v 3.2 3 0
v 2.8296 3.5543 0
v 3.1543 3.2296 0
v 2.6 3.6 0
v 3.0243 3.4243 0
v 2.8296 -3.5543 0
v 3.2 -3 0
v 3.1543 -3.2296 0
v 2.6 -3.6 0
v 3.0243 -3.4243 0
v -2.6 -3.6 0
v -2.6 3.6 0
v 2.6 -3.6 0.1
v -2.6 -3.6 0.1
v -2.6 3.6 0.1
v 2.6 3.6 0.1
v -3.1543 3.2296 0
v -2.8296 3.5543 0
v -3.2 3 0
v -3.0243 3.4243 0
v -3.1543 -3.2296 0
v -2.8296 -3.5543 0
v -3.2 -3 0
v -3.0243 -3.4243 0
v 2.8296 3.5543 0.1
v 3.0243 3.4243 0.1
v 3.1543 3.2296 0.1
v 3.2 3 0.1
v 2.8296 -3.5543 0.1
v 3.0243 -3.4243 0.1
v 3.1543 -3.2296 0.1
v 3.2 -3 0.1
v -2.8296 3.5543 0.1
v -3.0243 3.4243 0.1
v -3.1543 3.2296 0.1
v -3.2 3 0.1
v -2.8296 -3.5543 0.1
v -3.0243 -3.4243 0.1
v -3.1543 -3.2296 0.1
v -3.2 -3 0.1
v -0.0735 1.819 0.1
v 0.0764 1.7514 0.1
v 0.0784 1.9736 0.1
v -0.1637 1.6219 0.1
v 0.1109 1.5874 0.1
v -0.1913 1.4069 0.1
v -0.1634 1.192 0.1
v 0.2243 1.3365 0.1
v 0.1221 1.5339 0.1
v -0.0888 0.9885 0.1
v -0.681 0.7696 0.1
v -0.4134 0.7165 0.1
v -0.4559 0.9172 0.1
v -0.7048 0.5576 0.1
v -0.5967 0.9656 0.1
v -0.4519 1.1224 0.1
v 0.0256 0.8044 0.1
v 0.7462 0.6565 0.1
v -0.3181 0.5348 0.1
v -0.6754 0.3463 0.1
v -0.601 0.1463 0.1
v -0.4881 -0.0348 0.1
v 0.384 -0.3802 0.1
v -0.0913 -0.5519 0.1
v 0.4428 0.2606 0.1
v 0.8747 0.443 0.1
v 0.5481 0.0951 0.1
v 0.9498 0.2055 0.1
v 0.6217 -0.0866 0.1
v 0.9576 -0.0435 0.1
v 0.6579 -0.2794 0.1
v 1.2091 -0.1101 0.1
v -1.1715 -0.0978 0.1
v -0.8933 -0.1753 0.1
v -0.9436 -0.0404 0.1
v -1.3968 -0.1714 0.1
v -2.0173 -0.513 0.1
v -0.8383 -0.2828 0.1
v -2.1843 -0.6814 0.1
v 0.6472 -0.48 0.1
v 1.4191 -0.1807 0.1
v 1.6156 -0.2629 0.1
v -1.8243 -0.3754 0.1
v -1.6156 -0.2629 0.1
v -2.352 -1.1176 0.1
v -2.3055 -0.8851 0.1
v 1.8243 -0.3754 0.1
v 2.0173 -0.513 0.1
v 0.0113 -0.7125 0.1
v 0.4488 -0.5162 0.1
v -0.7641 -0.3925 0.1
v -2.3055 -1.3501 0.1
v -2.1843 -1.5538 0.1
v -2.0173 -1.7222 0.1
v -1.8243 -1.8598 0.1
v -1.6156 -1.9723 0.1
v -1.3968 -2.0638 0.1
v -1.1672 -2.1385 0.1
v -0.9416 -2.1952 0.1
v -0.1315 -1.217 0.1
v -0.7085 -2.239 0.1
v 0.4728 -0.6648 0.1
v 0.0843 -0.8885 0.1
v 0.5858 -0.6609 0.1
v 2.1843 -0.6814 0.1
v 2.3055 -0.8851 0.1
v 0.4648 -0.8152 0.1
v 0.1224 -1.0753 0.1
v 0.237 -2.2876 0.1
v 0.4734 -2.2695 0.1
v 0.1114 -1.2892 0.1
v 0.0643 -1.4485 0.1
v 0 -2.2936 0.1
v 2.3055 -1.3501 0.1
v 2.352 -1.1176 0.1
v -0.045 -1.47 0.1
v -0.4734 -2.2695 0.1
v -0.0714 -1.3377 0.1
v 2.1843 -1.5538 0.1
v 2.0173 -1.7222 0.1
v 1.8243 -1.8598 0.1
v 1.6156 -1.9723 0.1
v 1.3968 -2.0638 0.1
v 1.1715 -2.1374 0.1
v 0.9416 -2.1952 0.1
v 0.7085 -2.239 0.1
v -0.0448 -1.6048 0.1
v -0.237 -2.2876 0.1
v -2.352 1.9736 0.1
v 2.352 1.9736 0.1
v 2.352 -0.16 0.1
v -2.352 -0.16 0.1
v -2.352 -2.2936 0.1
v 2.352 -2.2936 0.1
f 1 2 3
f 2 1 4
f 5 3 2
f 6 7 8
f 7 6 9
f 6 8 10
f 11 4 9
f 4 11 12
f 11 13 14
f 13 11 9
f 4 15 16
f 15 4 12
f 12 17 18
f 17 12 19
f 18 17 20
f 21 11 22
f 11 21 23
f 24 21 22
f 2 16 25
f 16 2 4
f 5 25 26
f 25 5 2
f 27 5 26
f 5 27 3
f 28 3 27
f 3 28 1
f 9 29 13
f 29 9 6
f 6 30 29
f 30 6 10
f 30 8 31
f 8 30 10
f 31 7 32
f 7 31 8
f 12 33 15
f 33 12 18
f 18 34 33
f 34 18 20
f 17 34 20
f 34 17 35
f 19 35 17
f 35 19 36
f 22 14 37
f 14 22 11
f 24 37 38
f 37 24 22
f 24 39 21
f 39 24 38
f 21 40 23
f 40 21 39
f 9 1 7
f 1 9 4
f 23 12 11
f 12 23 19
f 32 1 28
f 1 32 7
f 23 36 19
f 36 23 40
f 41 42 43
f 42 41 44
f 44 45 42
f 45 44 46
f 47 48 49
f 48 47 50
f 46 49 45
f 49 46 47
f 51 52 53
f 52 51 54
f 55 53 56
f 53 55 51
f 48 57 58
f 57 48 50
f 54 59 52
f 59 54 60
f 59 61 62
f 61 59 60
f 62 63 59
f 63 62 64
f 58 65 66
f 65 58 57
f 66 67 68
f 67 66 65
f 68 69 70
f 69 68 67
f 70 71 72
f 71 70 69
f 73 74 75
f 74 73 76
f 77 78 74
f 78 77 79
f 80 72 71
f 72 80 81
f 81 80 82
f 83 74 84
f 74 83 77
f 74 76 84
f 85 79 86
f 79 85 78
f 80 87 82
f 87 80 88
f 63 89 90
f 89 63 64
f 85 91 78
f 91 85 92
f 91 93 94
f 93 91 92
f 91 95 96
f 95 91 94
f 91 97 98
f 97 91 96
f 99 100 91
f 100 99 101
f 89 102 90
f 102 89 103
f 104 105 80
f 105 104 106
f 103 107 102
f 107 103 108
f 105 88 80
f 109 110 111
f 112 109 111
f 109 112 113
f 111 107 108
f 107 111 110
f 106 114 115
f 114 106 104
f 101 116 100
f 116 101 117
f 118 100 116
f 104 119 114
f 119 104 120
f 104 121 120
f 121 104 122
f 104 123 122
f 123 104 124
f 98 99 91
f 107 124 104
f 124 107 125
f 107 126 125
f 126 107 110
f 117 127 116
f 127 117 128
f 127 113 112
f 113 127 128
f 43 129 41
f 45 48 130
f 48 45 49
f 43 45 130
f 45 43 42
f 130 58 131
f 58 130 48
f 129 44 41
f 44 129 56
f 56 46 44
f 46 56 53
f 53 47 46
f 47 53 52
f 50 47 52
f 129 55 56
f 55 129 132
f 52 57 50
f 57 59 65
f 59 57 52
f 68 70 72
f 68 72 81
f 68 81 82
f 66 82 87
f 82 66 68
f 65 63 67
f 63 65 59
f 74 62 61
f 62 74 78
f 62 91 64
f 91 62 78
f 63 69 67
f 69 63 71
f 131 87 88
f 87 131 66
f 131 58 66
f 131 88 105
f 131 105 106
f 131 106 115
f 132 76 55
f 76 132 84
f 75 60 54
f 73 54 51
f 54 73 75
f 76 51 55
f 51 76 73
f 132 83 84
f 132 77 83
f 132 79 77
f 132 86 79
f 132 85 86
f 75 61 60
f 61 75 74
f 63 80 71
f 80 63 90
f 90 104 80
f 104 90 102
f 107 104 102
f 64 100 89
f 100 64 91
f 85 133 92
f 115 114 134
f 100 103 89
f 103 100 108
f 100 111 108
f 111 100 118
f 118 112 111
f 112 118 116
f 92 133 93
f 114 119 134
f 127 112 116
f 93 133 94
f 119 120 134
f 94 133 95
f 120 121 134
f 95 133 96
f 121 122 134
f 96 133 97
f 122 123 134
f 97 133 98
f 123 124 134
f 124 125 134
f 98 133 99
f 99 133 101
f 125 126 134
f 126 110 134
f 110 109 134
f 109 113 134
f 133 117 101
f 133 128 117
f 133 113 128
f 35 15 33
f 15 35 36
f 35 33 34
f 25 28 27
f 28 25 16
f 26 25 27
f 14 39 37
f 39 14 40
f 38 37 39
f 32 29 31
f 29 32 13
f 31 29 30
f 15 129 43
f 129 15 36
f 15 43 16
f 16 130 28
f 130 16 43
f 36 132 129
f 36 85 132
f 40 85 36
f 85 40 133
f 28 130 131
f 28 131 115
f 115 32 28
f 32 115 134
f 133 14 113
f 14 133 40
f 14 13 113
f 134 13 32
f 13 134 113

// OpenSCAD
// file: ../p/box3u12.scad
use <../lib.scad>
function ldraw_lib__box3u12() = [
// 0 Box with 3 Parallel Faces without Any Edges
// 0 Name: box3u12.dat
// 0 Author: J.C. Tchang [tchang]
// 0 !LDRAW_ORG Primitive UPDATE 2014-02
// 0 !LICENSE Licensed under CC BY 4.0 : see CAreadme.txt
// 
// 0 BFC CERTIFY CCW
  [0,"BFC","CERTIFY"],
  [0,"BFC","CCW"],
// 
// 0 !HISTORY 2014-12-23 [PTadmin] Official Update 2014-02
// 
// 
// 4 16 -1 1 1 1 1 1 1 1 -1 -1 1 -1
  [4,16,-1,1,1,1,1,1,1,1,-1,-1,1,-1],
// 4 16 -1 1 1 -1 0 1 1 0 1 1 1 1
  [4,16,-1,1,1,-1,0,1,1,0,1,1,1,1],
// 4 16 1 1 -1 1 0 -1 -1 0 -1 -1 1 -1
  [4,16,1,1,-1,1,0,-1,-1,0,-1,-1,1,-1],
];
module ldraw_lib__box3u12(step=0, col=false, unit=2/5, alt=false, line=0.2, solid=!$preview)
    makepoly(ldraw_lib__box3u12(), step=step, col=col, unit=unit, alt=alt, line=line, solid=solid);
ldraw_lib__box3u12(line=0.2);
// file: ../p/1-4cyli.scad
use <../lib.scad>
function ldraw_lib__1_4cyli() = [
// 0 Cylinder 0.25
// 0 Name: 1-4cyli.dat
// 0 Author: James Jessiman
// 0 !LDRAW_ORG Primitive UPDATE 2012-01
// 0 !LICENSE Licensed under CC BY 4.0 : see CAreadme.txt
// 
// 0 BFC CERTIFY CCW
  [0,"BFC","CERTIFY"],
  [0,"BFC","CCW"],
// 
// 0 !HISTORY 2002-03-23 [sbliss] Added BFC statement.
// 0 !HISTORY 2002-04-25 [PTadmin] Official Update 2002-02
// 0 !HISTORY 2007-06-22 [PTadmin] Header formatted for Contributor Agreement
// 0 !HISTORY 2008-07-01 [PTadmin] Official Update 2008-01
// 0 !HISTORY 2012-02-16 [Philo] Changed to CCW
// 0 !HISTORY 2012-03-30 [PTadmin] Official Update 2012-01
// 
// 
// 4 16 1 1 0 0.9239 1 0.3827 0.9239 0 0.3827 1 0 0
  [4,16,1,1,0,0.9239,1,0.3827,0.9239,0,0.3827,1,0,0],
// 5 24 1 0 0 1 1 0 0.9239 0 0.3827 1 0 -1
  [5,24,1,0,0,1,1,0,0.9239,0,0.3827,1,0,-1],
// 4 16 0.9239 1 0.3827 0.7071 1 0.7071 0.7071 0 0.7071 0.9239 0 0.3827
  [4,16,0.9239,1,0.3827,0.7071,1,0.7071,0.7071,0,0.7071,0.9239,0,0.3827],
// 5 24 0.9239 0 0.3827 0.9239 1 0.3827 0.7071 0 0.7071 1 0 0
  [5,24,0.9239,0,0.3827,0.9239,1,0.3827,0.7071,0,0.7071,1,0,0],
// 4 16 0.7071 1 0.7071 0.3827 1 0.9239 0.3827 0 0.9239 0.7071 0 0.7071
  [4,16,0.7071,1,0.7071,0.3827,1,0.9239,0.3827,0,0.9239,0.7071,0,0.7071],
// 5 24 0.7071 0 0.7071 0.7071 1 0.7071 0.3827 0 0.9239 0.9239 0 0.3827
  [5,24,0.7071,0,0.7071,0.7071,1,0.7071,0.3827,0,0.9239,0.9239,0,0.3827],
// 4 16 0.3827 1 0.9239 0 1 1 0 0 1 0.3827 0 0.9239
  [4,16,0.3827,1,0.9239,0,1,1,0,0,1,0.3827,0,0.9239],
// 5 24 0.3827 0 0.9239 0.3827 1 0.9239 0 0 1 0.7071 0 0.7071
  [5,24,0.3827,0,0.9239,0.3827,1,0.9239,0,0,1,0.7071,0,0.7071],
// 5 24 0 0 1 0 1 1 0.3827 0 0.9239 -1 0 1
  [5,24,0,0,1,0,1,1,0.3827,0,0.9239,-1,0,1],
];
module ldraw_lib__1_4cyli(step=0, col=false, unit=2/5, alt=false, line=0.2, solid=!$preview)
    makepoly(ldraw_lib__1_4cyli(), step=step, col=col, unit=unit, alt=alt, line=line, solid=solid);
ldraw_lib__1_4cyli(line=0.2);
// file: s/stickerback008x009.scad
use <../../lib.scad>
use <../../p/1-4chrd.scad>
use <../../p/1-4cyli.scad>
use <../../p/box3u12.scad>
function ldraw_lib__s__stickerback008x009() = [
// 0 ~Sticker Back  0.8 x  0.9
// 0 Name: s\stickerback008x009.dat
// 0 Author: Massimo Maso [Sirio]
// 0 !LDRAW_ORG Subpart UPDATE 2026-05
// 0 !LICENSE Licensed under CC BY 4.0 : see CAreadme.txt
// 
// 0 BFC CERTIFY CCW
  [0,"BFC","CERTIFY"],
  [0,"BFC","CCW"],
// 
// 0 !HISTORY 2025-08-31 [OrionP] Official Update 2025-08
// 0 !HISTORY 2026-04-18 [MagFors] corrected length
// 0 !HISTORY 2026-05-31 [OrionP] Official Update 2026-05
// 
// 0 // Primitives
// 1 16 -7.5 0 6.5 -1.5 0 0 0 -1 0 0 0 1.5 1-4chrd.dat
  [1,16,-7.5,0,6.5,-1.5,0,0,0,-1,0,0,0,1.5, ldraw_lib__1_4chrd()],
// 1 16 7.5 0 6.5 1.5 0 0 0 -1 0 0 0 1.5 1-4chrd.dat
  [1,16,7.5,0,6.5,1.5,0,0,0,-1,0,0,0,1.5, ldraw_lib__1_4chrd()],
// 1 16 0 -.25 0 0 0 9 0 .25 0 6.5 0 0 box3u12.dat
  [1,16,0,-.25,0,0,0,9,0,.25,0,6.5,0,0, ldraw_lib__box3u12()],
// 1 16 -7.5 0 -6.5 -1.5 0 0 0 -1 0 0 0 -1.5 1-4chrd.dat
  [1,16,-7.5,0,-6.5,-1.5,0,0,0,-1,0,0,0,-1.5, ldraw_lib__1_4chrd()],
// 1 16 7.5 0 -6.5 1.5 0 0 0 -1 0 0 0 -1.5 1-4chrd.dat
  [1,16,7.5,0,-6.5,1.5,0,0,0,-1,0,0,0,-1.5, ldraw_lib__1_4chrd()],
// 1 16 -7.5 0 6.5 -1.5 0 0 0 -.25 0 0 0 1.5 1-4cyli.dat
  [1,16,-7.5,0,6.5,-1.5,0,0,0,-.25,0,0,0,1.5, ldraw_lib__1_4cyli()],
// 1 16 7.5 0 6.5 1.5 0 0 0 -.25 0 0 0 1.5 1-4cyli.dat
  [1,16,7.5,0,6.5,1.5,0,0,0,-.25,0,0,0,1.5, ldraw_lib__1_4cyli()],
// 1 16 -7.5 0 -6.5 -1.5 0 0 0 -.25 0 0 0 -1.5 1-4cyli.dat
  [1,16,-7.5,0,-6.5,-1.5,0,0,0,-.25,0,0,0,-1.5, ldraw_lib__1_4cyli()],
// 1 16 7.5 0 -6.5 1.5 0 0 0 -.25 0 0 0 -1.5 1-4cyli.dat
  [1,16,7.5,0,-6.5,1.5,0,0,0,-.25,0,0,0,-1.5, ldraw_lib__1_4cyli()],
// 0 // Bottom face
// 4 16 -7.5 0 8 7.5 0 8 9 0 6.5 -9 0 6.5
  [4,16,-7.5,0,8,7.5,0,8,9,0,6.5,-9,0,6.5],
// 4 16 -7.5 0 -8 -9 0 -6.5 9 0 -6.5 7.5 0 -8
  [4,16,-7.5,0,-8,-9,0,-6.5,9,0,-6.5,7.5,0,-8],
// 0 // Lateral face
// 4 16 -7.5 0 8 -7.5 -.25 8 7.5 -.25 8 7.5 0 8
  [4,16,-7.5,0,8,-7.5,-.25,8,7.5,-.25,8,7.5,0,8],
// 4 16 -7.5 0 -8 7.5 0 -8 7.5 -.25 -8 -7.5 -.25 -8
  [4,16,-7.5,0,-8,7.5,0,-8,7.5,-.25,-8,-7.5,-.25,-8],
];
module ldraw_lib__s__stickerback008x009(step=0, col=false, unit=2/5, alt=false, line=0.2, solid=!$preview)
    makepoly(ldraw_lib__s__stickerback008x009(), step=step, col=col, unit=unit, alt=alt, line=line, solid=solid);
ldraw_lib__s__stickerback008x009(line=0.2);
// file: ../p/logo-santander-icon.scad
use <../lib.scad>
function ldraw_lib__logo_santander_icon() = [
// 0 Logo Santander Icon
// 0 Name: logo-santander-icon.dat
// 0 Author: Massimo Maso [Sirio]
// 0 !LDRAW_ORG Primitive UPDATE 2026-05
// 0 !LICENSE Licensed under CC BY 4.0 : see CAreadme.txt
// 
// 0 !HELP Exact dimensions X = 5.6; Z = 5.08
// 
// 0 BFC CERTIFY CCW
  [0,"BFC","CERTIFY"],
  [0,"BFC","CCW"],
// 
// 0 !HISTORY 2025-06-16 [Sirio] Made primitive from subpart s\logosantanders02a
// 0 !HISTORY 2026-04-18 [MagFors] removed some vertices
// 0 !HISTORY 2026-05-31 [OrionP] Official Update 2026-05
// 
// 0 // Icon
// 4 16 .0933 0 2.54 -.0875 0 2.356 -.1949 0 2.1213 .091 0 2.2755
  [4,16,.0933,0,2.54,-.0875,0,2.356,-.1949,0,2.1213,.091,0,2.2755],
// 4 16 .091 0 2.2755 -.1949 0 2.1213 -.2277 0 1.8654 .132 0 2.0802
  [4,16,.091,0,2.2755,-.1949,0,2.1213,-.2277,0,1.8654,.132,0,2.0802],
// 4 16 -.1057 0 1.3673 .267 0 1.7815 .1454 0 2.0165 -.1945 0 1.6095
  [4,16,-.1057,0,1.3673,.267,0,1.7815,.1454,0,2.0165,-.1945,0,1.6095],
// 4 16 .132 0 2.0802 -.2277 0 1.8654 -.1945 0 1.6095 .1454 0 2.0165
  [4,16,.132,0,2.0802,-.2277,0,1.8654,-.1945,0,1.6095,.1454,0,2.0165],
// 4 16 -.5427 0 1.2824 -.8107 0 1.1067 -.8391 0 .8543 -.4921 0 1.0434
  [4,16,-.5427,0,1.2824,-.8107,0,1.1067,-.8391,0,.8543,-.4921,0,1.0434],
// 4 16 -.8107 0 1.1067 -.5427 0 1.2824 -.538 0 1.5267 -.7103 0 1.34
  [4,16,-.8107,0,1.1067,-.5427,0,1.2824,-.538,0,1.5267,-.7103,0,1.34],
// 4 16 -.1057 0 1.3673 .0305 0 1.1481 .8883 0 .972 .267 0 1.7815
  [4,16,-.1057,0,1.3673,.0305,0,1.1481,.8883,0,.972,.267,0,1.7815],
// 4 16 -.3787 0 .8271 -.4921 0 1.0434 -.8391 0 .8543 -.8041 0 .6027
  [4,16,-.3787,0,.8271,-.4921,0,1.0434,-.8391,0,.8543,-.8041,0,.6027],
// 4 16 -.3787 0 .8271 -.8041 0 .6027 -.7155 0 .3647 -.5811 0 .1491
  [4,16,-.3787,0,.8271,-.8041,0,.6027,-.7155,0,.3647,-.5811,0,.1491],
// 4 16 -.3787 0 .8271 -.5811 0 .1491 -.1087 0 -.4666 .4571 0 -.2622
  [4,16,-.3787,0,.8271,-.5811,0,.1491,-.1087,0,-.4666,.4571,0,-.2622],
// 4 16 .0305 0 1.1481 .5272 0 .5007 1.0413 0 .7179 .8883 0 .972
  [4,16,.0305,0,1.1481,.5272,0,.5007,1.0413,0,.7179,.8883,0,.972],
// 4 16 1.1307 0 .4351 1.0413 0 .7179 .5272 0 .5007 .6525 0 .3037
  [4,16,1.1307,0,.4351,1.0413,0,.7179,.5272,0,.5007,.6525,0,.3037],
// 4 16 1.14 0 .1387 1.1307 0 .4351 .6525 0 .3037 .7401 0 .0874
  [4,16,1.14,0,.1387,1.1307,0,.4351,.6525,0,.3037,.7401,0,.0874],
// 4 16 .7401 0 .0874 .7832 0 -.1421 1.4394 0 .0594 1.14 0 .1387
  [4,16,.7401,0,.0874,.7832,0,-.1421,1.4394,0,.0594,1.14,0,.1387],
// 4 16 -1.3946 0 .074 -1.6629 0 -.0136 -1.0635 0 -.0182 -1.1233 0 .1424
  [4,16,-1.3946,0,.074,-1.6629,0,-.0136,-1.0635,0,-.0182,-1.1233,0,.1424],
// 4 16 -.998 0 -.1462 -1.0635 0 -.0182 -2.4016 0 -.4202 -2.6003 0 -.6207
  [4,16,-.998,0,-.1462,-1.0635,0,-.0182,-2.4016,0,-.4202,-2.6003,0,-.6207],
// 4 16 .7832 0 -.1421 .7705 0 -.3809 1.6894 0 -.0247 1.4394 0 .0594
  [4,16,.7832,0,-.1421,.7705,0,-.3809,1.6894,0,-.0247,1.4394,0,.0594],
// 3 16 1.6894 0 -.0247 .7705 0 -.3809 1.9233 0 -.1225
  [3,16,1.6894,0,-.0247,.7705,0,-.3809,1.9233,0,-.1225],
// 4 16 -2.4016 0 -.4202 -1.0635 0 -.0182 -1.9233 0 -.1225 -2.1718 0 -.2564
  [4,16,-2.4016,0,-.4202,-1.0635,0,-.0182,-1.9233,0,-.1225,-2.1718,0,-.2564],
// 3 16 -1.0635 0 -.0182 -1.6629 0 -.0136 -1.9233 0 -.1225
  [3,16,-1.0635,0,-.0182,-1.6629,0,-.0136,-1.9233,0,-.1225],
// 4 16 -2.6003 0 -.6207 -2.7447 0 -.8632 -2.8 0 -1.14 -.998 0 -.1462
  [4,16,-2.6003,0,-.6207,-2.7447,0,-.8632,-2.8,0,-1.14,-.998,0,-.1462],
// 4 16 2.1718 0 -.2564 1.9233 0 -.1225 .7705 0 -.3809 2.4016 0 -.4202
  [4,16,2.1718,0,-.2564,1.9233,0,-.1225,.7705,0,-.3809,2.4016,0,-.4202],
// 4 16 .4571 0 -.2622 -.1087 0 -.4666 .0135 0 -.6577 .5343 0 -.424
  [4,16,.4571,0,-.2622,-.1087,0,-.4666,.0135,0,-.6577,.5343,0,-.424],
// 4 16 -2.8 0 -1.14 -2.7447 0 -1.4168 -.9097 0 -.2768 -.998 0 -.1462
  [4,16,-2.8,0,-1.14,-2.7447,0,-1.4168,-.9097,0,-.2768,-.998,0,-.1462],
// 4 16 -2.4016 0 -1.8598 -.9097 0 -.2768 -2.7447 0 -1.4168 -2.6003 0 -1.6593
  [4,16,-2.4016,0,-1.8598,-.9097,0,-.2768,-2.7447,0,-1.4168,-2.6003,0,-1.6593],
// 4 16 -1.9233 0 -2.1575 -.9097 0 -.2768 -2.4016 0 -1.8598 -2.1718 0 -2.0236
  [4,16,-1.9233,0,-2.1575,-.9097,0,-.2768,-2.4016,0,-1.8598,-2.1718,0,-2.0236],
// 4 16 -1.9233 0 -2.1575 -1.6629 0 -2.2664 -1.3895 0 -2.3553 -.9097 0 -.2768
  [4,16,-1.9233,0,-2.1575,-1.6629,0,-2.2664,-1.3895,0,-2.3553,-.9097,0,-.2768],
// 4 16 -.9097 0 -.2768 -1.1209 0 -2.4229 -.8435 0 -2.475 -.1566 0 -1.2583
  [4,16,-.9097,0,-.2768,-1.1209,0,-2.4229,-.8435,0,-2.475,-.1566,0,-1.2583],
// 4 16 .5343 0 -.424 .0135 0 -.6577 .1004 0 -.8673 .5629 0 -.601
  [4,16,.5343,0,-.424,.0135,0,-.6577,.1004,0,-.8673,.5629,0,-.601],
// 4 16 2.7447 0 -.8632 2.6003 0 -.6207 .7705 0 -.3809 .6974 0 -.5963
  [4,16,2.7447,0,-.8632,2.6003,0,-.6207,.7705,0,-.3809,.6974,0,-.5963],
// 4 16 .5629 0 -.601 .1004 0 -.8673 .1457 0 -1.0896 .5533 0 -.78
  [4,16,.5629,0,-.601,.1004,0,-.8673,.1457,0,-1.0896,.5533,0,-.78],
// 3 16 2.6003 0 -.6207 2.4016 0 -.4202 .7705 0 -.3809
  [3,16,2.6003,0,-.6207,2.4016,0,-.4202,.7705,0,-.3809],
// 3 16 .2821 0 -2.5329 .5636 0 -2.5113 .1326 0 -1.3443
  [3,16,.2821,0,-2.5329,.5636,0,-2.5113,.1326,0,-1.3443],
// 4 16 .1326 0 -1.3443 .0765 0 -1.5339 0 0 -2.54 .2821 0 -2.5329
  [4,16,.1326,0,-1.3443,.0765,0,-1.5339,0,0,-2.54,.2821,0,-2.5329],
// 4 16 .1457 0 -1.0896 .1326 0 -1.3443 .5636 0 -2.5113 .5533 0 -.78
  [4,16,.1457,0,-1.0896,.1326,0,-1.3443,.5636,0,-2.5113,.5533,0,-.78],
// 4 16 2.7447 0 -1.4168 2.8 0 -1.14 2.7447 0 -.8632 .6974 0 -.5963
  [4,16,2.7447,0,-1.4168,2.8,0,-1.14,2.7447,0,-.8632,.6974,0,-.5963],
// 4 16 -.1566 0 -1.2583 -.8435 0 -2.475 -.5636 0 -2.5113 -.0536 0 -1.5595
  [4,16,-.1566,0,-1.2583,-.8435,0,-2.475,-.5636,0,-2.5113,-.0536,0,-1.5595],
// 3 16 -.085 0 -1.402 -.1566 0 -1.2583 -.0536 0 -1.5595
  [3,16,-.085,0,-1.402,-.1566,0,-1.2583,-.0536,0,-1.5595],
// 4 16 2.7447 0 -1.4168 .6974 0 -.5963 2.4016 0 -1.8598 2.6003 0 -1.6593
  [4,16,2.7447,0,-1.4168,.6974,0,-.5963,2.4016,0,-1.8598,2.6003,0,-1.6593],
// 4 16 2.4016 0 -1.8598 .6974 0 -.5963 1.9233 0 -2.1575 2.1718 0 -2.0236
  [4,16,2.4016,0,-1.8598,.6974,0,-.5963,1.9233,0,-2.1575,2.1718,0,-2.0236],
// 4 16 1.3946 0 -2.354 1.6629 0 -2.2664 1.9233 0 -2.1575 .6974 0 -.5963
  [4,16,1.3946,0,-2.354,1.6629,0,-2.2664,1.9233,0,-2.1575,.6974,0,-.5963],
// 3 16 -1.3895 0 -2.3553 -1.1209 0 -2.4229 -.9097 0 -.2768
  [3,16,-1.3895,0,-2.3553,-1.1209,0,-2.4229,-.9097,0,-.2768],
// 4 16 1.1209 0 -2.4229 1.3946 0 -2.354 .6974 0 -.5963 .5533 0 -.78
  [4,16,1.1209,0,-2.4229,1.3946,0,-2.354,.6974,0,-.5963,.5533,0,-.78],
// 4 16 .8435 0 -2.475 1.1209 0 -2.4229 .5533 0 -.78 .5636 0 -2.5113
  [4,16,.8435,0,-2.475,1.1209,0,-2.4229,.5533,0,-.78,.5636,0,-2.5113],
// 4 16 -.2821 0 -2.5329 -.0533 0 -1.72 -.0536 0 -1.5595 -.5636 0 -2.5113
  [4,16,-.2821,0,-2.5329,-.0533,0,-1.72,-.0536,0,-1.5595,-.5636,0,-2.5113],
// 4 16 0 0 -2.54 .0765 0 -1.5339 -.0533 0 -1.72 -.2821 0 -2.5329
  [4,16,0,0,-2.54,.0765,0,-1.5339,-.0533,0,-1.72,-.2821,0,-2.5329],
];
module ldraw_lib__logo_santander_icon(step=0, col=false, unit=2/5, alt=false, line=0.2, solid=!$preview)
    makepoly(ldraw_lib__logo_santander_icon(), step=step, col=col, unit=unit, alt=alt, line=line, solid=solid);
ldraw_lib__logo_santander_icon(line=0.2);
// file: ../p/1-4chrd.scad
use <../lib.scad>
function ldraw_lib__1_4chrd() = [
// 0 Chord 0.25
// 0 Name: 1-4chrd.dat
// 0 Author: Max Martin Richter [MMR1988]
// 0 !LDRAW_ORG Primitive UPDATE 2023-05
// 0 !LICENSE Licensed under CC BY 4.0 : see CAreadme.txt
// 
// 0 BFC CERTIFY CCW
  [0,"BFC","CERTIFY"],
  [0,"BFC","CCW"],
// 
// 0 !HISTORY 2004-04-22 [PTadmin] Official Update 2004-02
// 0 !HISTORY 2007-10-09 [PTadmin] Header formatted for Contributor Agreement
// 0 !HISTORY 2008-07-01 [PTadmin] Official Update 2008-01
// 0 !HISTORY 2012-08-02 [MMR1988] Re-creation with PrimGen2 and Rectifier
// 0 !HISTORY 2012-08-09 [PTadmin] Official Update 2012-02
// 0 !HISTORY 2023-10-27 [OrionP] Change author to MMR1988 from hafhead
// 0 !HISTORY 2023-10-31 [OrionP] Official Update 2023-05
// 
// 4 16 0.9239 0 0.3827 0.3827 0 0.9239 0 0 1 1 0 0
  [4,16,0.9239,0,0.3827,0.3827,0,0.9239,0,0,1,1,0,0],
// 3 16 0.7071 0 0.7071 0.3827 0 0.9239 0.9239 0 0.3827
  [3,16,0.7071,0,0.7071,0.3827,0,0.9239,0.9239,0,0.3827],
];
module ldraw_lib__1_4chrd(step=0, col=false, unit=2/5, alt=false, line=0.2, solid=!$preview)
    makepoly(ldraw_lib__1_4chrd(), step=step, col=col, unit=unit, alt=alt, line=line, solid=solid);
ldraw_lib__1_4chrd(line=0.2);
// main file
use <../lib.scad>
use <../p/1-4chrd.scad>
use <../p/logo-santander-icon-box.scad>
use <../p/logo-santander-icon.scad>
use <s/stickerback008x009.scad>
function ldraw_lib__6177954x() = [
// 0 Sticker  0.9 x  0.8 with Red Santander Logo on White Background
// 0 Name: 6177954x.dat
// 0 Author: Massimo Maso [Sirio]
// 0 !LDRAW_ORG Part UPDATE 2026-05
// 0 !LICENSE Licensed under CC BY 4.0 : see CAreadme.txt
// 
// 0 BFC CERTIFY CCW
  [0,"BFC","CERTIFY"],
  [0,"BFC","CCW"],
// 
// 0 !KEYWORDS Bricklink 75879stk01, Brickowl 956194, Ferrari, Rebrickable 30895
// 0 !KEYWORDS Scuderia, Set 75879, SF16-H, Speed Champions
// 
// 0 !HISTORY 2026-04-18 [MagFors] corrected length
// 0 !HISTORY 2026-05-31 [OrionP] Official Update 2026-05
// 
// 0 // Stickerback
// 1 16 0 0 0 0 0 1 0 1 0 -1 0 0 s\stickerback008x009.dat
  [1,16,0,0,0,0,0,1,0,1,0,-1,0,0, ldraw_lib__s__stickerback008x009()],
// 0 // Logo primitive
// 1 4 0 -.25 -.4 2.1 0 0 0 1 0 0 0 2.1 logo-santander-icon.dat
  [1,4,0,-.25,-.4,2.1,0,0,0,1,0,0,0,2.1, ldraw_lib__logo_santander_icon()],
// 1 15 0 -.25 -.4 2.1 0 0 0 1 0 0 0 2.1 logo-santander-icon-box.dat
  [1,15,0,-.25,-.4,2.1,0,0,0,1,0,0,0,2.1, ldraw_lib__logo_santander_icon_box()],
// 0 // Primitives
// 1 15 -6.5 -.25 7.5 -1.5 0 0 0 1 0 0 0 1.5 1-4chrd.dat
  [1,15,-6.5,-.25,7.5,-1.5,0,0,0,1,0,0,0,1.5, ldraw_lib__1_4chrd()],
// 1 15 6.5 -.25 7.5 1.5 0 0 0 1 0 0 0 1.5 1-4chrd.dat
  [1,15,6.5,-.25,7.5,1.5,0,0,0,1,0,0,0,1.5, ldraw_lib__1_4chrd()],
// 1 15 -6.5 -.25 -7.5 -1.5 0 0 0 1 0 0 0 -1.5 1-4chrd.dat
  [1,15,-6.5,-.25,-7.5,-1.5,0,0,0,1,0,0,0,-1.5, ldraw_lib__1_4chrd()],
// 1 15 6.5 -.25 -7.5 1.5 0 0 0 1 0 0 0 -1.5 1-4chrd.dat
  [1,15,6.5,-.25,-7.5,1.5,0,0,0,1,0,0,0,-1.5, ldraw_lib__1_4chrd()],
// 0 // Top face
// 4 15 -6.5 -.25 9 -8 -.25 7.5 -5.88 -.25 4.934 .1959 -.25 4.934
  [4,15,-6.5,-.25,9,-8,-.25,7.5,-5.88,-.25,4.934,.1959,-.25,4.934],
// 3 15 -6.5 -.25 9 .1959 -.25 4.934 6.5 -.25 9
  [3,15,-6.5,-.25,9,.1959,-.25,4.934,6.5,-.25,9],
// 4 15 6.5 -.25 9 .1959 -.25 4.934 5.88 -.25 4.934 8 -.25 7.5
  [4,15,6.5,-.25,9,.1959,-.25,4.934,5.88,-.25,4.934,8,-.25,7.5],
// 3 15 -8 -.25 7.5 -5.88 -.25 -.4 -5.88 -.25 4.934
  [3,15,-8,-.25,7.5,-5.88,-.25,-.4,-5.88,-.25,4.934],
// 3 15 -8 -.25 7.5 -5.88 -.25 -2.794 -5.88 -.25 -.4
  [3,15,-8,-.25,7.5,-5.88,-.25,-2.794,-5.88,-.25,-.4],
// 4 15 -8 -.25 7.5 -8 -.25 -7.5 -5.88 -.25 -5.734 -5.88 -.25 -2.794
  [4,15,-8,-.25,7.5,-8,-.25,-7.5,-5.88,-.25,-5.734,-5.88,-.25,-2.794],
// 3 15 8 -.25 7.5 5.88 -.25 4.934 5.88 -.25 -.4
  [3,15,8,-.25,7.5,5.88,-.25,4.934,5.88,-.25,-.4],
// 3 15 8 -.25 7.5 5.88 -.25 -.4 5.88 -.25 -2.794
  [3,15,8,-.25,7.5,5.88,-.25,-.4,5.88,-.25,-2.794],
// 4 15 8 -.25 7.5 5.88 -.25 -2.794 5.88 -.25 -5.734 8 -.25 -7.5
  [4,15,8,-.25,7.5,5.88,-.25,-2.794,5.88,-.25,-5.734,8,-.25,-7.5],
// 4 15 -6.5 -.25 -9 0 -.25 -5.734 -5.88 -.25 -5.734 -8 -.25 -7.5
  [4,15,-6.5,-.25,-9,0,-.25,-5.734,-5.88,-.25,-5.734,-8,-.25,-7.5],
// 3 15 -6.5 -.25 -9 6.5 -.25 -9 0 -.25 -5.734
  [3,15,-6.5,-.25,-9,6.5,-.25,-9,0,-.25,-5.734],
// 4 15 6.5 -.25 -9 8 -.25 -7.5 5.88 -.25 -5.734 0 -.25 -5.734
  [4,15,6.5,-.25,-9,8,-.25,-7.5,5.88,-.25,-5.734,0,-.25,-5.734],
];
module ldraw_lib__6177954x(step=0, col=false, unit=2/5, alt=false, line=0.2, solid=!$preview)
    makepoly(ldraw_lib__6177954x(), step=step, col=col, unit=unit, alt=alt, line=line, solid=solid);
ldraw_lib__6177954x(line=0.2);
